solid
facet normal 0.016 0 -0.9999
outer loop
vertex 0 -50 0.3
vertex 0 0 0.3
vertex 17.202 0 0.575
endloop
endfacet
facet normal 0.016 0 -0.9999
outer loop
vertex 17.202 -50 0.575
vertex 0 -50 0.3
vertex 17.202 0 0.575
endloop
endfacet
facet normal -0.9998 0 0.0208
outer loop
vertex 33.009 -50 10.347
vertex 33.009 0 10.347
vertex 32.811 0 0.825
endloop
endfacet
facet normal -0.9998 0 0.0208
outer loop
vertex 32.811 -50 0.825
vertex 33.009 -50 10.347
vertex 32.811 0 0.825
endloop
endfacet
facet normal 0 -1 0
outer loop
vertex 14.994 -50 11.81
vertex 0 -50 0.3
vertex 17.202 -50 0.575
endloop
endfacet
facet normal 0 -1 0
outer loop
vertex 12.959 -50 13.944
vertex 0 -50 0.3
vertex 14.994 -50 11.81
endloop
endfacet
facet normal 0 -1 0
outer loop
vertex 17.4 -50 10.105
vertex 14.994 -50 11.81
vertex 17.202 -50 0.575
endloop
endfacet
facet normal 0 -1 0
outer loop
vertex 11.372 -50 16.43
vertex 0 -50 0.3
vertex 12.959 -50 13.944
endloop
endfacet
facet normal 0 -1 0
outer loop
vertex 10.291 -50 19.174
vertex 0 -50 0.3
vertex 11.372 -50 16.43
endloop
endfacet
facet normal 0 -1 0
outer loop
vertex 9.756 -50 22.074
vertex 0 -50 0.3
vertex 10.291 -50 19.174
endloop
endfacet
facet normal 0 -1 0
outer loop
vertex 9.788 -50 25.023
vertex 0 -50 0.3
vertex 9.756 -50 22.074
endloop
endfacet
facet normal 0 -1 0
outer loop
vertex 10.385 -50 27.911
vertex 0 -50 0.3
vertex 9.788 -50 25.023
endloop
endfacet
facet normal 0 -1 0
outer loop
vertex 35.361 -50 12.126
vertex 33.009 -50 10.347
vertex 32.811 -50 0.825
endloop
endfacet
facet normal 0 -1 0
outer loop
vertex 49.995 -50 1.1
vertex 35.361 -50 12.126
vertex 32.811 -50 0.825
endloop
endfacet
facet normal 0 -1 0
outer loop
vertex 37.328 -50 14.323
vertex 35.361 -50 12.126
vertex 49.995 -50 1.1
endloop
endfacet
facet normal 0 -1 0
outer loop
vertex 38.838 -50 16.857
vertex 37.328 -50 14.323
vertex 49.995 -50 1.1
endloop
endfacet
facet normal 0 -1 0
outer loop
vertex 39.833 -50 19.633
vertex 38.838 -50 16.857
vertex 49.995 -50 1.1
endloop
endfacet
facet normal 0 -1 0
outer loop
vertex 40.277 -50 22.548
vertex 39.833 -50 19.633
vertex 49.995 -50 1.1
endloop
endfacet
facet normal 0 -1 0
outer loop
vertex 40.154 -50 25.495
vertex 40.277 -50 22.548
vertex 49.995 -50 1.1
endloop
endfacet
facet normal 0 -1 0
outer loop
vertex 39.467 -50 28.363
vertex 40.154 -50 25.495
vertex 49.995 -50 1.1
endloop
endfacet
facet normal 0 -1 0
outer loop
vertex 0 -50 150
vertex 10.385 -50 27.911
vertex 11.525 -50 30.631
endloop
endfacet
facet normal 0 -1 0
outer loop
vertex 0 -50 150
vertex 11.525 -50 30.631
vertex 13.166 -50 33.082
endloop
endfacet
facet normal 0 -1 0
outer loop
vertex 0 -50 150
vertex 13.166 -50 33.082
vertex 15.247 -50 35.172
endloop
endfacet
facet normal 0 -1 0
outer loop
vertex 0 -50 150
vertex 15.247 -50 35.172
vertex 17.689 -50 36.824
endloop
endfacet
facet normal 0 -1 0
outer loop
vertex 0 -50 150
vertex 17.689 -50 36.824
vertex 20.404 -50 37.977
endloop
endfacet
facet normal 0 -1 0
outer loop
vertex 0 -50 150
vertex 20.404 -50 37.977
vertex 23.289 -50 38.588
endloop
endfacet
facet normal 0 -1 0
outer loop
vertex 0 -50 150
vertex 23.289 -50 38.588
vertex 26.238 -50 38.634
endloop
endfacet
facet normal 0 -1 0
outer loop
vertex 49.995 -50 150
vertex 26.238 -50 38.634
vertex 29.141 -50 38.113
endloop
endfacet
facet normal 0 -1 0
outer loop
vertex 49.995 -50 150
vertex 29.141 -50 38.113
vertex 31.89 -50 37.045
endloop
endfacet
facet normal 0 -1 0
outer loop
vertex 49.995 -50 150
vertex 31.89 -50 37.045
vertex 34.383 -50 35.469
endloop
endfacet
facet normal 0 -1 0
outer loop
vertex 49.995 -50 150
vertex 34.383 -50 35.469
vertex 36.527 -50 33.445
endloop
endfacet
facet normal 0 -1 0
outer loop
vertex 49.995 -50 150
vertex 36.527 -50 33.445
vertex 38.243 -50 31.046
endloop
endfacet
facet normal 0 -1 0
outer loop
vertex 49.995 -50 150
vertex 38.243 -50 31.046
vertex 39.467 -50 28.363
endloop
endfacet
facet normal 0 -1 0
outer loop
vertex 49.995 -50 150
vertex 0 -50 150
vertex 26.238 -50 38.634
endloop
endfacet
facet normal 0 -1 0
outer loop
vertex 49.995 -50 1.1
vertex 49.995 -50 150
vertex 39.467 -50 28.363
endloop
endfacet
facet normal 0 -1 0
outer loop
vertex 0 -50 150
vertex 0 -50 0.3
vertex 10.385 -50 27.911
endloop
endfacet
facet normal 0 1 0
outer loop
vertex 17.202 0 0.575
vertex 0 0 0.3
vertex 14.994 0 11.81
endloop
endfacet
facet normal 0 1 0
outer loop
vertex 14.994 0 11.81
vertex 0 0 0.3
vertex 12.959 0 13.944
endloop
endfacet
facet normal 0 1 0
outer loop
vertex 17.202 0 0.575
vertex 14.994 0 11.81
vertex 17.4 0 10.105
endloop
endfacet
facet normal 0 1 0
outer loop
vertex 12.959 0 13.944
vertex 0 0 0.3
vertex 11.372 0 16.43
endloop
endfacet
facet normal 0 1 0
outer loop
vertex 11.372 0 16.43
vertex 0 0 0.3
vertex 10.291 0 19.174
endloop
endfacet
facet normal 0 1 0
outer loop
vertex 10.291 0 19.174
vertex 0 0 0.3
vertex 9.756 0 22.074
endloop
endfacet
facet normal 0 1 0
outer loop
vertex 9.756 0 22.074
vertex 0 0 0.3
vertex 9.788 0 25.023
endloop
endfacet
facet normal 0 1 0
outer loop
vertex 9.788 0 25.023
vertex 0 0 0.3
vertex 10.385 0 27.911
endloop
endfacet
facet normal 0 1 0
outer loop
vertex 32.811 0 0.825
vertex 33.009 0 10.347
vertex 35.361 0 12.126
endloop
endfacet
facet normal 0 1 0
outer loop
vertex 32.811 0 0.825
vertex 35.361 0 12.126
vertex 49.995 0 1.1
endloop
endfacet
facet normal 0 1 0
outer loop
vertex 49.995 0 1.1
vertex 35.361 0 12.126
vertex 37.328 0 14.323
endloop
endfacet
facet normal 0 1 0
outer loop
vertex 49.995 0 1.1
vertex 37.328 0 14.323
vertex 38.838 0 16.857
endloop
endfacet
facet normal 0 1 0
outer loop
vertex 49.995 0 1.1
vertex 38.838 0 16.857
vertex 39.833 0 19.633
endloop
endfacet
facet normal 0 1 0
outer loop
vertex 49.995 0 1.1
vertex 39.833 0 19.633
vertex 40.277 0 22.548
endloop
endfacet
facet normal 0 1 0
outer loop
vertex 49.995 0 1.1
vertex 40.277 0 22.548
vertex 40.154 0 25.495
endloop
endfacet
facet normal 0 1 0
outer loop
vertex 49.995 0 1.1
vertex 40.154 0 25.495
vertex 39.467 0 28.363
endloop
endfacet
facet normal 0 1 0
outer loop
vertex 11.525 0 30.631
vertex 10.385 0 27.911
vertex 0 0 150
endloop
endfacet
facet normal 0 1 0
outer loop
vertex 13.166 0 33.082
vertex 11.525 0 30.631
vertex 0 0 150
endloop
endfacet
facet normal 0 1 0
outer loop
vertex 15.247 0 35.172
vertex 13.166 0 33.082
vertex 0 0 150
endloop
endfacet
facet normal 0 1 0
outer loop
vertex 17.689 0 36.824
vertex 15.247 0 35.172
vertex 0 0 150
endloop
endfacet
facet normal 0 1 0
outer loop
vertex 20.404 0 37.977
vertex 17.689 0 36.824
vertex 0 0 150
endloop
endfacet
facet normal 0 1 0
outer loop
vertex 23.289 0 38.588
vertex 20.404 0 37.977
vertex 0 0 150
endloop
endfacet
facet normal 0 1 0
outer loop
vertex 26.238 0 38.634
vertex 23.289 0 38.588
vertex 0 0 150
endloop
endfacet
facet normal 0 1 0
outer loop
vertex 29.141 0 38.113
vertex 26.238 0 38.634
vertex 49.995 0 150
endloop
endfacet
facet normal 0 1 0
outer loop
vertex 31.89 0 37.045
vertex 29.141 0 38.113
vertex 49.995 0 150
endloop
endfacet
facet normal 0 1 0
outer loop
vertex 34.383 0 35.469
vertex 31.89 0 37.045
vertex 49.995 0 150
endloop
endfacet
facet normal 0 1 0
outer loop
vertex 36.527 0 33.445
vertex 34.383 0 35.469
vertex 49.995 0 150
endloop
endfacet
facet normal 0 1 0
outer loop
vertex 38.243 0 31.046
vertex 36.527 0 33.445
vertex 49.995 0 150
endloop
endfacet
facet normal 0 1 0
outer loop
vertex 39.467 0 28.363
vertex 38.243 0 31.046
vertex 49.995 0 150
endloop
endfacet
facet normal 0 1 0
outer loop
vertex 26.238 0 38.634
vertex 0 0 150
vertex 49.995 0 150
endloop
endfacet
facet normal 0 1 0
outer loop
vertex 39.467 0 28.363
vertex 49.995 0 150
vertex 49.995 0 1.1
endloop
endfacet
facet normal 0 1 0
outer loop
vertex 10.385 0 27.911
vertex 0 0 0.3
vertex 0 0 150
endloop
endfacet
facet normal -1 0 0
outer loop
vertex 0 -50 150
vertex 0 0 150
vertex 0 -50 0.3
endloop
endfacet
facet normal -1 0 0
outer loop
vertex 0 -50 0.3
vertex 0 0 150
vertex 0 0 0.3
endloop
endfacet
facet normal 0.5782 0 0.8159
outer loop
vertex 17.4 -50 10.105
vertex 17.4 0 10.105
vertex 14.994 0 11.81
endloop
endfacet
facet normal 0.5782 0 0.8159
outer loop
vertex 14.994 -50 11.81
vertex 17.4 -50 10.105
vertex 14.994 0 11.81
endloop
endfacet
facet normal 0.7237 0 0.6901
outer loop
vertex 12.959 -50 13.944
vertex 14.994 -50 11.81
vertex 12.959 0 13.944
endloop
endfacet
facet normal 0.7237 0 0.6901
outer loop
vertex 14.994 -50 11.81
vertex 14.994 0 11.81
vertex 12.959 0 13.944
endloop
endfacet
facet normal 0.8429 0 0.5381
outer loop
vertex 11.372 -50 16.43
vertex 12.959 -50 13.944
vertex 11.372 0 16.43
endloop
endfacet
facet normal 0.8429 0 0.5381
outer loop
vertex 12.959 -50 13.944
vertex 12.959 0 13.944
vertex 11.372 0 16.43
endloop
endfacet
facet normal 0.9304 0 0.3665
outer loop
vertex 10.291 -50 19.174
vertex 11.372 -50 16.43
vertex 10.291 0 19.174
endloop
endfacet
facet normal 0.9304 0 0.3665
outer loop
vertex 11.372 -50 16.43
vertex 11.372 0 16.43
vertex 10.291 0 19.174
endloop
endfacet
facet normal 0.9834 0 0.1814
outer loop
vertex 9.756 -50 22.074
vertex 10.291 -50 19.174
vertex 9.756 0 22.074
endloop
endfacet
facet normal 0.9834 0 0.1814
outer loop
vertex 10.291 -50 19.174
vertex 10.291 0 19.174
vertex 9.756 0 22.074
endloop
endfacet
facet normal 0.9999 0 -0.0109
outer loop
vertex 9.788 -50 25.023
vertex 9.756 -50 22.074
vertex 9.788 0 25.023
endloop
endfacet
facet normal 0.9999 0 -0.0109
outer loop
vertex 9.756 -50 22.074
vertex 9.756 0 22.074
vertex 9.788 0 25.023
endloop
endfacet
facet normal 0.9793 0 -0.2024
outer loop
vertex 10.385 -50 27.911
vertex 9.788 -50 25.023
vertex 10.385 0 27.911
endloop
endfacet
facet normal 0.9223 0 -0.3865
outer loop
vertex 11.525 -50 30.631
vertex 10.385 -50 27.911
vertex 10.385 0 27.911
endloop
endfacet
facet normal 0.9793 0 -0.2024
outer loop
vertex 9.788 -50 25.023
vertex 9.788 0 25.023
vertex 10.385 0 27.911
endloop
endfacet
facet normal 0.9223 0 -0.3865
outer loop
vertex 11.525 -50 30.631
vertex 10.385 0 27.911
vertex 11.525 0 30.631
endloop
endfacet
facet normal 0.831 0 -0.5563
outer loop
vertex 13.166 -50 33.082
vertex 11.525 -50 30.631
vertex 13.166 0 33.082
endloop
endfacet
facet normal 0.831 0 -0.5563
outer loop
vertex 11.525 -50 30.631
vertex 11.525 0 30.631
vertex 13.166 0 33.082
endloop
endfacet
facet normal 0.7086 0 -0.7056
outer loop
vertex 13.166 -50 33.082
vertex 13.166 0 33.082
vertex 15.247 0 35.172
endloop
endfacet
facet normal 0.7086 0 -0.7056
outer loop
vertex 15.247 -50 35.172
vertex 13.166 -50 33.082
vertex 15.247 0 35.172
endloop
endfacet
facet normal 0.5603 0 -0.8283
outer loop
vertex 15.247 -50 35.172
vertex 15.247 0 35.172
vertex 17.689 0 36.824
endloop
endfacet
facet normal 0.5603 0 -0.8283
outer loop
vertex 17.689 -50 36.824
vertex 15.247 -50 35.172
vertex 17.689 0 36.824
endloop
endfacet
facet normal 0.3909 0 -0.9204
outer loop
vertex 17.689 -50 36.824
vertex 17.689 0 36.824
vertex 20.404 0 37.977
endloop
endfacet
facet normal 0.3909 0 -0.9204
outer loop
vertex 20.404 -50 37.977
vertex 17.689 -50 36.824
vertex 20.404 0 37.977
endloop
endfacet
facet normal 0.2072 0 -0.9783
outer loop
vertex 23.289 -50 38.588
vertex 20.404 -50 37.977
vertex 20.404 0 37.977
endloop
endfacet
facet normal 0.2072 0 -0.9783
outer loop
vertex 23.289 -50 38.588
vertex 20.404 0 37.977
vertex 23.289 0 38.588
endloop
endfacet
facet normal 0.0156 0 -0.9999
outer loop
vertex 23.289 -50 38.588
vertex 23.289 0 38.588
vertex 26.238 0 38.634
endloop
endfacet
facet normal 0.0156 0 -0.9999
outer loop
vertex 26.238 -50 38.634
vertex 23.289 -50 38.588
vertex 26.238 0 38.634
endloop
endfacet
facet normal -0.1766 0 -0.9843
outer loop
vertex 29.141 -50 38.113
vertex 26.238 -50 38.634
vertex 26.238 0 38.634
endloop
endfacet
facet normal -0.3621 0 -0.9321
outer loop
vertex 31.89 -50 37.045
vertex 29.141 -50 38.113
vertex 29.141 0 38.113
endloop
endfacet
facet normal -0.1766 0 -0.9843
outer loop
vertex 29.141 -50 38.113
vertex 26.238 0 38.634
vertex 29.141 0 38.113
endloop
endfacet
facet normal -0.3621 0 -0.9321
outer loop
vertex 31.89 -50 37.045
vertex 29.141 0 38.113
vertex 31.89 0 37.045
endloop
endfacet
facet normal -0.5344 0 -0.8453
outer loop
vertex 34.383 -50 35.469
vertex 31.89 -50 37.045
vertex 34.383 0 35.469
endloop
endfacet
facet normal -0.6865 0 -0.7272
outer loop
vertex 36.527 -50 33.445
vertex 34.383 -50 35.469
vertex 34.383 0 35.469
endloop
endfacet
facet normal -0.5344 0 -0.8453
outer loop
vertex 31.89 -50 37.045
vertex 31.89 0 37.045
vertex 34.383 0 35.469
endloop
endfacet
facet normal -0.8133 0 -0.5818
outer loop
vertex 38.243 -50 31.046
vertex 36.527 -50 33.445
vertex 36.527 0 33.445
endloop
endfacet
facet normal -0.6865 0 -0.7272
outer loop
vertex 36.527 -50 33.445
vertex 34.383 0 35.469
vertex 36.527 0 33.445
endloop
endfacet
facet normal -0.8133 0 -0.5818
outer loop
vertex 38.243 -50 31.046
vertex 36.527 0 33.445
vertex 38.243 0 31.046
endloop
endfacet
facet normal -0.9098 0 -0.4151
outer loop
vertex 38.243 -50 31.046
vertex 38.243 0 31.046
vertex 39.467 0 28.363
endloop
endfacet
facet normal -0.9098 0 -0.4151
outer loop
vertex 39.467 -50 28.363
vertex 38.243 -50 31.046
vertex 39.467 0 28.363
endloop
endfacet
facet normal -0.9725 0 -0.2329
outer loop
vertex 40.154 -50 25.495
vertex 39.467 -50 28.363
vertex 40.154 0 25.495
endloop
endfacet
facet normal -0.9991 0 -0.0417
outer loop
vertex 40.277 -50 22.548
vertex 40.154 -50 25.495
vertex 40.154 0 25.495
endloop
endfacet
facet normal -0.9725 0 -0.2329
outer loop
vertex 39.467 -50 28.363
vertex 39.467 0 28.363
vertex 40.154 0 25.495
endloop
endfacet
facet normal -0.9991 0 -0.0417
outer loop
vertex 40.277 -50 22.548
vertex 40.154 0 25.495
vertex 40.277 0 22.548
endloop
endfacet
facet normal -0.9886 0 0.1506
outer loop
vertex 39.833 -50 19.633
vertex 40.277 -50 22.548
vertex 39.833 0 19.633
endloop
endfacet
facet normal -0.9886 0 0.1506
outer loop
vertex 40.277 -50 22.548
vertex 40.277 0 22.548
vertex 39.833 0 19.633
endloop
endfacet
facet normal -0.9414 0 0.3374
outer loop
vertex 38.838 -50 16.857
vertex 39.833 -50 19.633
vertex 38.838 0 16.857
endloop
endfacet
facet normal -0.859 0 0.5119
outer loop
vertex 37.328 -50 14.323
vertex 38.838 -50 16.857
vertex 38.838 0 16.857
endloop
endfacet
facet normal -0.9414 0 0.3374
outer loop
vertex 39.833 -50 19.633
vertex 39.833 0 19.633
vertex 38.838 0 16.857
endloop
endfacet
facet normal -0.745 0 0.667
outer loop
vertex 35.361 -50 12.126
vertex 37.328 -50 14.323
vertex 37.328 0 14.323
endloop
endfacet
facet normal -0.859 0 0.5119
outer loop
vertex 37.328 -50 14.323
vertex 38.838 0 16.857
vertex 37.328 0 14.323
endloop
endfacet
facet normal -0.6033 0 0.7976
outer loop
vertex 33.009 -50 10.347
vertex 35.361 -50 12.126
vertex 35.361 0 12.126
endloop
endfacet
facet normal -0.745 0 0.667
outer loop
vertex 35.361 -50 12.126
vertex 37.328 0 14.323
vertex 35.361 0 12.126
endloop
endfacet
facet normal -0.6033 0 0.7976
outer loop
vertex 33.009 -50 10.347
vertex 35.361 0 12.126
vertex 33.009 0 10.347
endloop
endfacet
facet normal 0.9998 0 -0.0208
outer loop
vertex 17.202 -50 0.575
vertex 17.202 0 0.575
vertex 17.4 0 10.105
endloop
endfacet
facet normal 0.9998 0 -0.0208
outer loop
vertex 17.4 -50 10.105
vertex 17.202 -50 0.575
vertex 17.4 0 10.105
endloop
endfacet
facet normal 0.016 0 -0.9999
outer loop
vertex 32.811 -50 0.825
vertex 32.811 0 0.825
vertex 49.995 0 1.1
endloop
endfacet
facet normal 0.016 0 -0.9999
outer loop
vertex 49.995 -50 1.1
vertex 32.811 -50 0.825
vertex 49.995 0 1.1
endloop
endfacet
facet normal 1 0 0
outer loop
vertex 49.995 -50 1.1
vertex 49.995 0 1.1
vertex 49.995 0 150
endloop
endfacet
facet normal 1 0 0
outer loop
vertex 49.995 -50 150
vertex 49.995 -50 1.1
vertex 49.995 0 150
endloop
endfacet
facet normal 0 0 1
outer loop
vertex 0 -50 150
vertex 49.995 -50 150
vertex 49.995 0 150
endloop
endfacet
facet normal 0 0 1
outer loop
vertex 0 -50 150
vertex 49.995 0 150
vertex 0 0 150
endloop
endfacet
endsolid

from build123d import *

# Parameters (mm, degrees)
F1_DEPTH = 50


with BuildPart() as f1:
    # F0 (on Front) → F1 (new body)
    with BuildSketch(Plane.XZ):
        with BuildLine():
            Line((33.008534, 10.347258), (32.810526, 0.825341))
            Line((32.810526, 0.825341), (49.995198, 1.100471))
            Line((49.995198, 1.100471), (49.995198, 150))
            Line((49.995198, 150), (0, 150))
            Line((0, 150), (0, 0.300038))
            Line((0, 0.300038), (17.201957, 0.575445))
            Line((17.201957, 0.575445), (17.400121, 10.104875))
            ThreePointArc((17.400121, 10.104875), (24.762435, 38.682031), (33.008534, 10.347258))
        make_face()
    extrude(amount=F1_DEPTH)


solid = f1.part
